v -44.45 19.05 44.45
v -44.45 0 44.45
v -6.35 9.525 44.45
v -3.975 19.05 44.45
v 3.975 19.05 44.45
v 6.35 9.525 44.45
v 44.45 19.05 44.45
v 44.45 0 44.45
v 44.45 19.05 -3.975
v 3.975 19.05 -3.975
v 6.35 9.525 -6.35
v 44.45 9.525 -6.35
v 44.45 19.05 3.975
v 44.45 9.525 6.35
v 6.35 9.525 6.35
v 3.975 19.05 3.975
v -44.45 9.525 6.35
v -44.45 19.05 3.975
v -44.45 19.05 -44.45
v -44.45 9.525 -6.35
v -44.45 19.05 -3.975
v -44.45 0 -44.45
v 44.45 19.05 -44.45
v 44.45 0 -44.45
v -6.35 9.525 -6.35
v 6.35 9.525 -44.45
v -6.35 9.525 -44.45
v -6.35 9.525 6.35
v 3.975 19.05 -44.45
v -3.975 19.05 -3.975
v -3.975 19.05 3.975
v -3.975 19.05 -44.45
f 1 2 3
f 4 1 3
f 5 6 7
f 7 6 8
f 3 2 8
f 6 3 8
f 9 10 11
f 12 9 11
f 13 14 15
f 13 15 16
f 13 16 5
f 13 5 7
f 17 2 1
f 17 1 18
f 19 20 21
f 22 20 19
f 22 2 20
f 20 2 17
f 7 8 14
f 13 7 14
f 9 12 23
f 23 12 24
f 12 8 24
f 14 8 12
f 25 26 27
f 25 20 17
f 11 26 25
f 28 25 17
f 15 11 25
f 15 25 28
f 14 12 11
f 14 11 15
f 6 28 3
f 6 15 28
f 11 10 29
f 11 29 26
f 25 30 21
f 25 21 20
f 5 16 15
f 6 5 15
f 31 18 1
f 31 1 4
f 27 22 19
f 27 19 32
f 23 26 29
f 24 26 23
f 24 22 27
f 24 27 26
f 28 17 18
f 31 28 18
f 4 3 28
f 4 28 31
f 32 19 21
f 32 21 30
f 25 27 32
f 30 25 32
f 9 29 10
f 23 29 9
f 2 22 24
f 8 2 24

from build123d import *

# Parameters (mm, degrees)
SKETCH1_W          = 88.9
SKETCH1_H          = 88.9
BASE_EXTRUDE_DEPTH = 19.05
CUT_EXTRUDE1_DEPTH = 89.9
CUT_EXTRUDE2_DEPTH = 89.9


with BuildPart() as part:
    # Sketch1 → Base-Extrude (new body)
    with BuildSketch(Plane(origin=(0, 0, 0), x_dir=(1, 0, 0), z_dir=(0, 1, 0))):
        Rectangle(SKETCH1_W, SKETCH1_H)
    extrude(amount=BASE_EXTRUDE_DEPTH)

    # Sketch2 → Cut-Extrude1 (cut, through all)
    with BuildSketch(Plane.XY.offset(44.45)):
        Polygon((6.35, 9.525), (-6.35, 9.525), (-3.975150773, 19.05), (3.975150773, 19.05), align=None)
    extrude(amount=-CUT_EXTRUDE1_DEPTH, mode=Mode.SUBTRACT)

    # Sketch3 → Cut-Extrude2 (cut, through all)
    with BuildSketch(Plane(origin=(44.45, -3.538159269, -0.664564519), x_dir=(0, 0, -1), z_dir=(1, 0, 0))):
        Polygon((5.685435481, 13.063159269), (-7.014564519, 13.063159269), (-4.639715292, 22.588159269), (3.310586254, 22.588159269), align=None)
    extrude(amount=-CUT_EXTRUDE2_DEPTH, mode=Mode.SUBTRACT)


solid = part.part
